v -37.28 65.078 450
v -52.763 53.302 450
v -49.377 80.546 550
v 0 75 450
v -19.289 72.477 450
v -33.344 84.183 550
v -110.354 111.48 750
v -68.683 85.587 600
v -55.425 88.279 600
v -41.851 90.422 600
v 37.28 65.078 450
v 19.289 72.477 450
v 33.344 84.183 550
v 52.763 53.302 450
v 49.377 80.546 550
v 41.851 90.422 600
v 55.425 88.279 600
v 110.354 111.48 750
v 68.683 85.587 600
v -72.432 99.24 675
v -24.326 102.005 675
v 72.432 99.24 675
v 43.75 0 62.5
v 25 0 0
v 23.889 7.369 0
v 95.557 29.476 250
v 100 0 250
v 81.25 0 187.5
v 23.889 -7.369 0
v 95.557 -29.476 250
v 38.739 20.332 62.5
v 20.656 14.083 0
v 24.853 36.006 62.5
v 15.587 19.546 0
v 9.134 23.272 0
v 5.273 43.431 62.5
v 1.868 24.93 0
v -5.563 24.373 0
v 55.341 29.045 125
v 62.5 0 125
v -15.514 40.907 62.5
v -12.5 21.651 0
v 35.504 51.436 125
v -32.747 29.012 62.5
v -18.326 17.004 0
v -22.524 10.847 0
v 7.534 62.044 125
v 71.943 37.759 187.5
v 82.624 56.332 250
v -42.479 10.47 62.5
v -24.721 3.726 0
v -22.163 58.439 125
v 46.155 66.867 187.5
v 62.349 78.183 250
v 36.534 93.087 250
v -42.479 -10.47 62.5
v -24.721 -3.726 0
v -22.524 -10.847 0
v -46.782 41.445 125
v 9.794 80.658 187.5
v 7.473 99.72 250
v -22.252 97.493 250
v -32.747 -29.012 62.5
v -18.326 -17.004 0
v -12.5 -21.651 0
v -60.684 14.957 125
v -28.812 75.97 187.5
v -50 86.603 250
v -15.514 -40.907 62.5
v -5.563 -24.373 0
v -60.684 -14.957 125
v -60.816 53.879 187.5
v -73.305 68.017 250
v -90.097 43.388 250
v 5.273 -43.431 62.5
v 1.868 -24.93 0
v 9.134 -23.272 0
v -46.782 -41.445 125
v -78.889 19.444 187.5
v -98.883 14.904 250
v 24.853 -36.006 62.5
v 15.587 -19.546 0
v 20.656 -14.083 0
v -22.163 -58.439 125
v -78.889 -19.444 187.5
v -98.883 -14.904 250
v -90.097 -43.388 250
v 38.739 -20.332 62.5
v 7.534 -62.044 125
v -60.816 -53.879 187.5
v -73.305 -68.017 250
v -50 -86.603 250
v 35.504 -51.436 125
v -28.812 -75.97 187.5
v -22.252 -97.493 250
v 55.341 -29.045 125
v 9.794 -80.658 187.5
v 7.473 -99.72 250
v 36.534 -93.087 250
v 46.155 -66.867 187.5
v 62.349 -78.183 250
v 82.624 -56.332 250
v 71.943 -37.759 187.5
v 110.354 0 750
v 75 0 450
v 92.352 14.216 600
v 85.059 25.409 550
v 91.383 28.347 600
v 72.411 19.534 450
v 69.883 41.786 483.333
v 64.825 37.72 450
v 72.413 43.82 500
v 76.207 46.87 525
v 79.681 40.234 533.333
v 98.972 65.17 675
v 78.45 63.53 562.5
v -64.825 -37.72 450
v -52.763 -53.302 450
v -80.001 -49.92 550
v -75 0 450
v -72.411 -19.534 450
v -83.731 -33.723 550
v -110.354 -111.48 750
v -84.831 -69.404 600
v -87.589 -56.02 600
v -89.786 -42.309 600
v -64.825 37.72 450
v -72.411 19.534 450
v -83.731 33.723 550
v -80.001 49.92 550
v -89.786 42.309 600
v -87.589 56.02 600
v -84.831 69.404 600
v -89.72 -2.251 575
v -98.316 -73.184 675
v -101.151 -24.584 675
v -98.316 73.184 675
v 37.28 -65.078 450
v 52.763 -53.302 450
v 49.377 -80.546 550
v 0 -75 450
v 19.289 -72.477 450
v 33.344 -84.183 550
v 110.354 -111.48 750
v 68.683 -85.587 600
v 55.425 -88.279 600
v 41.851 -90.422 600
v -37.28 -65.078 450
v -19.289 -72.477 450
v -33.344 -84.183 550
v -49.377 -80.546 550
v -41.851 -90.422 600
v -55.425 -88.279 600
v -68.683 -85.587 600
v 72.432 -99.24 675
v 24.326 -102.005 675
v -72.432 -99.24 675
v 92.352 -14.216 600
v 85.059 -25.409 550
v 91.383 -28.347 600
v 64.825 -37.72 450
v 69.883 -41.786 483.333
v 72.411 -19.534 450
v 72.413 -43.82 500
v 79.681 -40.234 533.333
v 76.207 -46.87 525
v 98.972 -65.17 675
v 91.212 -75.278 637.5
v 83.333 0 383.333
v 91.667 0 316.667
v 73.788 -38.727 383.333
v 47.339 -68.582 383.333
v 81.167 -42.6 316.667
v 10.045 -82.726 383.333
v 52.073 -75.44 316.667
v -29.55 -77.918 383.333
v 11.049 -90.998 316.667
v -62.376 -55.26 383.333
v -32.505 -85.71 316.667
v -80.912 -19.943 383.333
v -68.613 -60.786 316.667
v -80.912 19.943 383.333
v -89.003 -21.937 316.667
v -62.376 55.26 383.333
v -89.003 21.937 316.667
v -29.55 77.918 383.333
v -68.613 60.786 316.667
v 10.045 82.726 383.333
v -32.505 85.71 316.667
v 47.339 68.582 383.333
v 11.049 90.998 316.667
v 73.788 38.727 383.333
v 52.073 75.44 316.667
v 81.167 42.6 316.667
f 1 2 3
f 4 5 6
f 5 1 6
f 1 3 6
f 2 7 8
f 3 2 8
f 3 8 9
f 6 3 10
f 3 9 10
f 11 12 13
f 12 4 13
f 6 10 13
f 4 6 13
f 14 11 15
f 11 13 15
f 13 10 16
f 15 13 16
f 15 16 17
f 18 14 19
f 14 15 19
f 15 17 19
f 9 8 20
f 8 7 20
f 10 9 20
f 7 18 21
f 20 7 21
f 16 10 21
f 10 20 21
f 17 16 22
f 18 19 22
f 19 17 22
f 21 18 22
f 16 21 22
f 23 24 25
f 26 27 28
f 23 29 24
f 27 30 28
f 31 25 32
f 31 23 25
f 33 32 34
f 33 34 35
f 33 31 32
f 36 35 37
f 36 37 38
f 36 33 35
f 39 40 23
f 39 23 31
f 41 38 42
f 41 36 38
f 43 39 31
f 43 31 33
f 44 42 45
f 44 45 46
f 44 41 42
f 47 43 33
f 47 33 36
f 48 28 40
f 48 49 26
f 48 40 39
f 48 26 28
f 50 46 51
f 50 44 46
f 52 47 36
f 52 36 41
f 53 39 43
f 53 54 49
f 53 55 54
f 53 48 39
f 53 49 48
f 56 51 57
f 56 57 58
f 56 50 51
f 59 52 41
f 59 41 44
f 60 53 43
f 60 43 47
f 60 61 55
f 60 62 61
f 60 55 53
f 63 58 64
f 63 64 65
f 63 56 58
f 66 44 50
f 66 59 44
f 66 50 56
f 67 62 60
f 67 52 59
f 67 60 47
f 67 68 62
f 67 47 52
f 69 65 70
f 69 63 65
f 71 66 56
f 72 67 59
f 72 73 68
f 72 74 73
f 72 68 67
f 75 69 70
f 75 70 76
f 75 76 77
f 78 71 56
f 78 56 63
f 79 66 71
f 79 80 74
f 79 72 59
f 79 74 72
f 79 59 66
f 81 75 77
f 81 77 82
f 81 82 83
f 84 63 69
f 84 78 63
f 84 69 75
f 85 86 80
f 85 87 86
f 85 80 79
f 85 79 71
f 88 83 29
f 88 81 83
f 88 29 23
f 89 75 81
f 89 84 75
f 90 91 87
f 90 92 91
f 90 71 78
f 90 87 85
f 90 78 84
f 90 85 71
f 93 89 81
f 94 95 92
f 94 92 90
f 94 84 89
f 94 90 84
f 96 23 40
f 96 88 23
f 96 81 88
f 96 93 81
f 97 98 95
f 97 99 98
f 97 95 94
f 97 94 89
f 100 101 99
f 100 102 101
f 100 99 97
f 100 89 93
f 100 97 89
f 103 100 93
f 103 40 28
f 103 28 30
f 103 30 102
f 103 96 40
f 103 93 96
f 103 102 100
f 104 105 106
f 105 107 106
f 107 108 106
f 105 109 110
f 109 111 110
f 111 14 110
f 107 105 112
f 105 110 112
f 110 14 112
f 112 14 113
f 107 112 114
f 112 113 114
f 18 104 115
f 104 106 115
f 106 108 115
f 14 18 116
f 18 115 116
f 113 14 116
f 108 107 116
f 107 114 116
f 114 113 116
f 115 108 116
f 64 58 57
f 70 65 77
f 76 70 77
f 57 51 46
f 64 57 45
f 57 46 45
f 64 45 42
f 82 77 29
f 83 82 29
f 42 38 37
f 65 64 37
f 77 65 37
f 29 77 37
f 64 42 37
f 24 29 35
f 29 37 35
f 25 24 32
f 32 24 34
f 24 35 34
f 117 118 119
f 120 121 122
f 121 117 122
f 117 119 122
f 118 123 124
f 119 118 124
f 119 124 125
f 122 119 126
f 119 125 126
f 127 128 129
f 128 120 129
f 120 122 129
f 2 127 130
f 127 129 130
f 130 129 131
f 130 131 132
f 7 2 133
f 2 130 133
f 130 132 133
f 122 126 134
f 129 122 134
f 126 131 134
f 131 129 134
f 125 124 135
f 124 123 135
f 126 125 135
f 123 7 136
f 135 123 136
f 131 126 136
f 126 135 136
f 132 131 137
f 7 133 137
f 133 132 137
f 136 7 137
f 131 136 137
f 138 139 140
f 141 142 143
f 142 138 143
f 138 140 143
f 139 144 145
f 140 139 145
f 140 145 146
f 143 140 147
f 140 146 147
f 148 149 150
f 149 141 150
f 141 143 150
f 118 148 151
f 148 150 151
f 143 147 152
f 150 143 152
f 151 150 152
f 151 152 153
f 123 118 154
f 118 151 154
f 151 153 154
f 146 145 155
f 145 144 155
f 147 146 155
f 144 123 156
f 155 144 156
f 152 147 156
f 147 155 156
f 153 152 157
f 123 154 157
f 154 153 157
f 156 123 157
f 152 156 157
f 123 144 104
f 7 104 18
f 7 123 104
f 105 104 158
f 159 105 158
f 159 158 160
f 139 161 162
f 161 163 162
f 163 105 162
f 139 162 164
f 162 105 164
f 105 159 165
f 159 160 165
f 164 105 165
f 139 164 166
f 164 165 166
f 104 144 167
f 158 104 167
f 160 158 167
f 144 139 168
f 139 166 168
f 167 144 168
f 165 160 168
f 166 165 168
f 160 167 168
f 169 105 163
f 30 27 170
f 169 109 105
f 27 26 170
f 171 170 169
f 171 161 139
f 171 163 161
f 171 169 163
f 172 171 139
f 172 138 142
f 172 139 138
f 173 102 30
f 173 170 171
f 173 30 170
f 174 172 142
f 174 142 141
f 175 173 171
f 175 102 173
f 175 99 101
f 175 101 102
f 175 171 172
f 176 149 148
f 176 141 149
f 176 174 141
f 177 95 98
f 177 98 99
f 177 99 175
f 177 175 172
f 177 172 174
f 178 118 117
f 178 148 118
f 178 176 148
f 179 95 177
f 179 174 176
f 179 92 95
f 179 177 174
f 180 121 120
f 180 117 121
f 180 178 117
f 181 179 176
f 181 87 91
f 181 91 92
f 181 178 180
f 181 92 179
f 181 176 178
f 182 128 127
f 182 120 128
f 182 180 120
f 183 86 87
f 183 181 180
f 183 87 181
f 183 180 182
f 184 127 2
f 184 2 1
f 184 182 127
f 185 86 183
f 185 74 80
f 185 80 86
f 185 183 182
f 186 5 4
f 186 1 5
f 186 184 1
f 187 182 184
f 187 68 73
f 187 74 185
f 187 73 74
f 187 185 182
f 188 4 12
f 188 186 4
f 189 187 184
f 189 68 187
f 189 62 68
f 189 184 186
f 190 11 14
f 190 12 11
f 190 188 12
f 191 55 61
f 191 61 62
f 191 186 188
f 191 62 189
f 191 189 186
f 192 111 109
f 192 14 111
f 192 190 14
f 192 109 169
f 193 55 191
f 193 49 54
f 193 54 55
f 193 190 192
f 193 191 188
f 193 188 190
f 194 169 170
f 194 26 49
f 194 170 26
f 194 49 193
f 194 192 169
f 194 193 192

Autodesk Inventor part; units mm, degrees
ref_plane "YZ Plane" through (0, 0, 0) normal (1, 0, 0) x (0, 1, 0)
ref_plane "XZ Plane" through (0, 0, 0) normal (0, 1, 0) x (-1, 0, 0)
sketch "Sketch1" plane through (0, 0, 0) normal (0, 0, 1) x (1, 0, 0)
  circle A0 centre (0, 0) radius 25
  dimension "d0" = 50
ref_plane "Work Plane1" through (0, 0, 250) normal (0, 0, 1) x (1, 0, 0)
sketch "Sketch2" plane through (0, 0, 250) normal (0, 0, 1) x (1, 0, 0)
  circle A0 centre (0, 0) radius 100
  line L0 (0, 0) -> (0, -169.491589)
  line L1 (-100, 0) -> (-100, -163.22364)
  dimension "d2" = 200
sketch "Sketch1 outline for Loft1" plane through (0, 0, 0) normal (0, 0, 1) x (1, 0, 0)
  circle A0 centre (0, 0) radius 25
sketch "Sketch2 outline for Loft1" plane through (0, 0, 250) normal (0, 0, 1) x (1, 0, 0)
  circle A0 centre (0, 0) radius 100
loft "Loft1" add profiles "Sketch1 outline for Loft1", "Sketch2 outline for Loft1"
ref_plane "Work Plane6" through (0, 0, 450) normal (0, 0, 1) x (1, 0, 0)
sketch "Sketch7" plane through (0, 0, 450) normal (0, 0, 1) x (1, 0, 0)
  circle A0 centre (0, 0) radius 75
  dimension "d15" = 150
sketch "Sketch7 outline for Loft2" plane through (0, 0, 450) normal (0, 0, 1) x (1, 0, 0)
  circle A0 centre (0, 0) radius 75
loft "Loft2" add profiles "Sketch7 outline for Loft2" section 1 edges at (-100, 0, 250)
ref_plane "Work Plane7" through (0, 0, 750) normal (0, 0, 1) x (1, 0, 0)
sketch "Sketch8" plane through (0, 0, 750) normal (0, 0, 1) x (1, 0, 0)
  line L0 (110.354309, -111.480379) -> (-110.354309, -111.480379)
  line L1 (-110.354309, -111.480379) -> (-110.354309, 111.480379)
  line L2 (-110.354309, 111.480379) -> (110.354309, 111.480379)
  line L3 (110.354309, 111.480379) -> (110.354309, -111.480379)
  line L4 (110.354309, -111.480379) -> (-110.354309, 111.480379) construction
  line L5 (-110.354309, -111.480379) -> (110.354309, 111.480379) construction
  point P0 (0, 0)
sketch "Sketch8 outline for Loft3" plane through (0, 0, 750) normal (0, 0, 1) x (1, 0, 0)
  line L0 (110.354309, -111.480379) -> (-110.354309, -111.480379)
  line L1 (-110.354309, -111.480379) -> (-110.354309, 111.480379)
  line L2 (-110.354309, 111.480379) -> (110.354309, 111.480379)
  line L3 (110.354309, 111.480379) -> (110.354309, -111.480379)
loft "Loft3" add profiles "Sketch8 outline for Loft3" section 1 edges at (-75, 0, 450)
properties part number "PartOne"
